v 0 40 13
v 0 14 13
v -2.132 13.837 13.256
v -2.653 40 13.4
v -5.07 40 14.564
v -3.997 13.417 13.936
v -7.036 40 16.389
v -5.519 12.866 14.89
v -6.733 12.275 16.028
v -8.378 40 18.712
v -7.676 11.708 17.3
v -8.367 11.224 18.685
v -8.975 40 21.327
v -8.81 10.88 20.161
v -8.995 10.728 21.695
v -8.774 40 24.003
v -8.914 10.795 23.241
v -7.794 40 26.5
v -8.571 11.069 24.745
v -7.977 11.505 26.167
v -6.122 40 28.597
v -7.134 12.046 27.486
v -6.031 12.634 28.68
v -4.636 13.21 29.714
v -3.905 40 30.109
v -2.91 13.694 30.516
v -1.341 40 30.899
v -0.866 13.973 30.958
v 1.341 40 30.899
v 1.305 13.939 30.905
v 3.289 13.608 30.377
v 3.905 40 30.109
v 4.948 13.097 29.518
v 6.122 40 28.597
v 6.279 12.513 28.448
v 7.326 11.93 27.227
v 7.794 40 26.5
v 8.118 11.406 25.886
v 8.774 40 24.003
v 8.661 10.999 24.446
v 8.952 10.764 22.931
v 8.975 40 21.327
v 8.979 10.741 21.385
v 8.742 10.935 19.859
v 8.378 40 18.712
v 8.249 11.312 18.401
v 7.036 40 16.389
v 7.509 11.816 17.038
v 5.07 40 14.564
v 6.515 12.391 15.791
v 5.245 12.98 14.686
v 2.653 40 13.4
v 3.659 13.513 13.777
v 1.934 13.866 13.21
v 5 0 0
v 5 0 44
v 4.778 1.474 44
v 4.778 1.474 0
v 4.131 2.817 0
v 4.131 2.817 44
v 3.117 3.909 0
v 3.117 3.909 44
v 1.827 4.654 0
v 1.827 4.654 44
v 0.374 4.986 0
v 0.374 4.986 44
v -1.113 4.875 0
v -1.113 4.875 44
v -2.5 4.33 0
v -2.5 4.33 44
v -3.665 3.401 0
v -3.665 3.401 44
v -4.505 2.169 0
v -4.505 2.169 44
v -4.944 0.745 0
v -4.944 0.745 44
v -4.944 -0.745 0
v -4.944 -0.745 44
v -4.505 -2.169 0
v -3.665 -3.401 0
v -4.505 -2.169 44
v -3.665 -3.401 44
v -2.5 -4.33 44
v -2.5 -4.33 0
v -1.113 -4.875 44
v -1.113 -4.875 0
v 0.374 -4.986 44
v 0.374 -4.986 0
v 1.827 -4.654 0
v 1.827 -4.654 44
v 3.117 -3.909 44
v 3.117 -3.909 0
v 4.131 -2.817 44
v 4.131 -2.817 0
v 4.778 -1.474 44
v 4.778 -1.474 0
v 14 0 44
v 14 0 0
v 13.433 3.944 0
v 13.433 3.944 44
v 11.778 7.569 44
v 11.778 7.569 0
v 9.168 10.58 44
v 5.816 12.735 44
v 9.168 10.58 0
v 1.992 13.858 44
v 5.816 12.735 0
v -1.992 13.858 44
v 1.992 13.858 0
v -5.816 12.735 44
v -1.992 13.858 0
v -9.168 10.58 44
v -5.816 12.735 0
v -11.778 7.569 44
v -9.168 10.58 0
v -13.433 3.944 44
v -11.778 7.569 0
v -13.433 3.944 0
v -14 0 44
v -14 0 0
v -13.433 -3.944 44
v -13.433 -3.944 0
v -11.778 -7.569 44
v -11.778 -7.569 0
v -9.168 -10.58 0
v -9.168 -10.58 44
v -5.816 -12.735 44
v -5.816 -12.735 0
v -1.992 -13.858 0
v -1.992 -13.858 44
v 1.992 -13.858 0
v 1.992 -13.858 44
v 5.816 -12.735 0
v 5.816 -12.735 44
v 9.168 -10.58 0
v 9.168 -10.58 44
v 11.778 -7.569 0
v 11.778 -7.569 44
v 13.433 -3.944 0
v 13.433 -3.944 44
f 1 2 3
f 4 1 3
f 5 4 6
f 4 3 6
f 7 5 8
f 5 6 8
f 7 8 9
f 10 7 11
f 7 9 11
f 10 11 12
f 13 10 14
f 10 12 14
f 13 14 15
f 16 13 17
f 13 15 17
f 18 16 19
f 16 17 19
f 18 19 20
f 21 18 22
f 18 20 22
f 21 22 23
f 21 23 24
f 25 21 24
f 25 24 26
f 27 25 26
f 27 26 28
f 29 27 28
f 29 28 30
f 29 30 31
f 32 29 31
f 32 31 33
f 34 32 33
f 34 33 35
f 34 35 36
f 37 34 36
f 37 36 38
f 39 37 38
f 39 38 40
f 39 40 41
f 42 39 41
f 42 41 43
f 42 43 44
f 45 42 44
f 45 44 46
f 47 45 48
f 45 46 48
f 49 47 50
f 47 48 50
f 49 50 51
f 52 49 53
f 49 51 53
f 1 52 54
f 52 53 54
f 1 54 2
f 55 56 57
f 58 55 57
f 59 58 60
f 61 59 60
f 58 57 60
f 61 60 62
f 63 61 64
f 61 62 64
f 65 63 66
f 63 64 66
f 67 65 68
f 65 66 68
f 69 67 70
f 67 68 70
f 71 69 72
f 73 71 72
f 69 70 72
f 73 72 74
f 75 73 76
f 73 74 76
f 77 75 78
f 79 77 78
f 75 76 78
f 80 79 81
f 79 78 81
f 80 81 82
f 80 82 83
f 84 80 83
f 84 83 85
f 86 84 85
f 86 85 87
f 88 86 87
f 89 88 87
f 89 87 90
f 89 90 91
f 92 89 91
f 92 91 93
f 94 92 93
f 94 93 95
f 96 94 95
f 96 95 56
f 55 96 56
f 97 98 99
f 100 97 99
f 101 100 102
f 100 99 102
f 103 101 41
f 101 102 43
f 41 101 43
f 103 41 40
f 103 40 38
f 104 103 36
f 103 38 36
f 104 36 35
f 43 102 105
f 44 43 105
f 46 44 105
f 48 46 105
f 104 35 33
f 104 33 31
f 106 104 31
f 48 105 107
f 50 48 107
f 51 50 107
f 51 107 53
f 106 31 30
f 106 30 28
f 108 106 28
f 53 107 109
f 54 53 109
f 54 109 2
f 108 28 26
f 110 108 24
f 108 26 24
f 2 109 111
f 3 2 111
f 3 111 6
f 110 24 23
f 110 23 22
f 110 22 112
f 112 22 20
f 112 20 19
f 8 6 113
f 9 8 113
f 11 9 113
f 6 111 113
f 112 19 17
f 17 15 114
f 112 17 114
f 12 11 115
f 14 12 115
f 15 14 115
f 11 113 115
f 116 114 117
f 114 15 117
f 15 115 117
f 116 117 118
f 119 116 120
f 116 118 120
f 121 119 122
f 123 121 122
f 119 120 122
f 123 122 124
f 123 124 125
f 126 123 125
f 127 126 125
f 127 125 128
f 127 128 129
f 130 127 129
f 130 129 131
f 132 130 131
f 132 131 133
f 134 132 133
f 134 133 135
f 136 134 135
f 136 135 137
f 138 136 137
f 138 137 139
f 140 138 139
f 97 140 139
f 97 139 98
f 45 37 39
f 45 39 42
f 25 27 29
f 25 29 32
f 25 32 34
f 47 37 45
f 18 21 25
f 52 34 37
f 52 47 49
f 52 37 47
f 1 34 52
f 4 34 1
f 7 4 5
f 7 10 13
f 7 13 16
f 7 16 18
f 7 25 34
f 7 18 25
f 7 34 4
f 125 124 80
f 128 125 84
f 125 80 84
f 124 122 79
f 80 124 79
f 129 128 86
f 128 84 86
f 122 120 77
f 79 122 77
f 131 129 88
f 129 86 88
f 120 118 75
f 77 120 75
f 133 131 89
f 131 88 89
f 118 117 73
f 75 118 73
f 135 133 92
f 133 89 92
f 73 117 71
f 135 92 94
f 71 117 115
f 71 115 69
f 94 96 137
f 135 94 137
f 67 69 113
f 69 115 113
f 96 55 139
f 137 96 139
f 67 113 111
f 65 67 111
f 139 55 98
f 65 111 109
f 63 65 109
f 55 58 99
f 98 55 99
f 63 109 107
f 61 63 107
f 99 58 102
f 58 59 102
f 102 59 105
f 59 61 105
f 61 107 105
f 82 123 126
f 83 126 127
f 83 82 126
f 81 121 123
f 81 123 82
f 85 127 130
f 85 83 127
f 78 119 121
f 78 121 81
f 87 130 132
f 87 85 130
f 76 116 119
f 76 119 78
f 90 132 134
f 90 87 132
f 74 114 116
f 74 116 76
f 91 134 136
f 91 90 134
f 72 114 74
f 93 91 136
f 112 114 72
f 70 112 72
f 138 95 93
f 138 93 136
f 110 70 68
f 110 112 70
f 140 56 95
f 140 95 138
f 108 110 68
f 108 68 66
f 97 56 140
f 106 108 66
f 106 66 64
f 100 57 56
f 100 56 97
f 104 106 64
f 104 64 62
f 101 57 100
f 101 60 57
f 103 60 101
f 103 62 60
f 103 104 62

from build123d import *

# Parameters (mm, degrees)
SKETCH1_R           = 14
BOSS_EXTRUDE1_DEPTH = 44
SKETCH2_R           = 9
BOSS_EXTRUDE2_DEPTH = 40
SKETCH3_R           = 5
CUT_EXTRUDE1_DEPTH  = 62.090097558


with BuildPart() as part:
    # Sketch1 → Boss-Extrude1 (new body)
    with BuildSketch(Plane.XY):
        Circle(SKETCH1_R)
    extrude(amount=BOSS_EXTRUDE1_DEPTH)

    # Sketch2 → Boss-Extrude2 (add)
    with BuildSketch(Plane(origin=(0, 0, 0), x_dir=(1, 0, 0), z_dir=(0, 1, 0))):
        with Locations(Location((0, -22, 0), (0, 0, 90))):
            Circle(SKETCH2_R)
    extrude(amount=BOSS_EXTRUDE2_DEPTH)

    # Sketch3 → Cut-Extrude1 (cut, through all)
    with BuildSketch(Plane.XY.offset(44)):
        Circle(SKETCH3_R)
    extrude(amount=-CUT_EXTRUDE1_DEPTH, mode=Mode.SUBTRACT)


solid = part.part
